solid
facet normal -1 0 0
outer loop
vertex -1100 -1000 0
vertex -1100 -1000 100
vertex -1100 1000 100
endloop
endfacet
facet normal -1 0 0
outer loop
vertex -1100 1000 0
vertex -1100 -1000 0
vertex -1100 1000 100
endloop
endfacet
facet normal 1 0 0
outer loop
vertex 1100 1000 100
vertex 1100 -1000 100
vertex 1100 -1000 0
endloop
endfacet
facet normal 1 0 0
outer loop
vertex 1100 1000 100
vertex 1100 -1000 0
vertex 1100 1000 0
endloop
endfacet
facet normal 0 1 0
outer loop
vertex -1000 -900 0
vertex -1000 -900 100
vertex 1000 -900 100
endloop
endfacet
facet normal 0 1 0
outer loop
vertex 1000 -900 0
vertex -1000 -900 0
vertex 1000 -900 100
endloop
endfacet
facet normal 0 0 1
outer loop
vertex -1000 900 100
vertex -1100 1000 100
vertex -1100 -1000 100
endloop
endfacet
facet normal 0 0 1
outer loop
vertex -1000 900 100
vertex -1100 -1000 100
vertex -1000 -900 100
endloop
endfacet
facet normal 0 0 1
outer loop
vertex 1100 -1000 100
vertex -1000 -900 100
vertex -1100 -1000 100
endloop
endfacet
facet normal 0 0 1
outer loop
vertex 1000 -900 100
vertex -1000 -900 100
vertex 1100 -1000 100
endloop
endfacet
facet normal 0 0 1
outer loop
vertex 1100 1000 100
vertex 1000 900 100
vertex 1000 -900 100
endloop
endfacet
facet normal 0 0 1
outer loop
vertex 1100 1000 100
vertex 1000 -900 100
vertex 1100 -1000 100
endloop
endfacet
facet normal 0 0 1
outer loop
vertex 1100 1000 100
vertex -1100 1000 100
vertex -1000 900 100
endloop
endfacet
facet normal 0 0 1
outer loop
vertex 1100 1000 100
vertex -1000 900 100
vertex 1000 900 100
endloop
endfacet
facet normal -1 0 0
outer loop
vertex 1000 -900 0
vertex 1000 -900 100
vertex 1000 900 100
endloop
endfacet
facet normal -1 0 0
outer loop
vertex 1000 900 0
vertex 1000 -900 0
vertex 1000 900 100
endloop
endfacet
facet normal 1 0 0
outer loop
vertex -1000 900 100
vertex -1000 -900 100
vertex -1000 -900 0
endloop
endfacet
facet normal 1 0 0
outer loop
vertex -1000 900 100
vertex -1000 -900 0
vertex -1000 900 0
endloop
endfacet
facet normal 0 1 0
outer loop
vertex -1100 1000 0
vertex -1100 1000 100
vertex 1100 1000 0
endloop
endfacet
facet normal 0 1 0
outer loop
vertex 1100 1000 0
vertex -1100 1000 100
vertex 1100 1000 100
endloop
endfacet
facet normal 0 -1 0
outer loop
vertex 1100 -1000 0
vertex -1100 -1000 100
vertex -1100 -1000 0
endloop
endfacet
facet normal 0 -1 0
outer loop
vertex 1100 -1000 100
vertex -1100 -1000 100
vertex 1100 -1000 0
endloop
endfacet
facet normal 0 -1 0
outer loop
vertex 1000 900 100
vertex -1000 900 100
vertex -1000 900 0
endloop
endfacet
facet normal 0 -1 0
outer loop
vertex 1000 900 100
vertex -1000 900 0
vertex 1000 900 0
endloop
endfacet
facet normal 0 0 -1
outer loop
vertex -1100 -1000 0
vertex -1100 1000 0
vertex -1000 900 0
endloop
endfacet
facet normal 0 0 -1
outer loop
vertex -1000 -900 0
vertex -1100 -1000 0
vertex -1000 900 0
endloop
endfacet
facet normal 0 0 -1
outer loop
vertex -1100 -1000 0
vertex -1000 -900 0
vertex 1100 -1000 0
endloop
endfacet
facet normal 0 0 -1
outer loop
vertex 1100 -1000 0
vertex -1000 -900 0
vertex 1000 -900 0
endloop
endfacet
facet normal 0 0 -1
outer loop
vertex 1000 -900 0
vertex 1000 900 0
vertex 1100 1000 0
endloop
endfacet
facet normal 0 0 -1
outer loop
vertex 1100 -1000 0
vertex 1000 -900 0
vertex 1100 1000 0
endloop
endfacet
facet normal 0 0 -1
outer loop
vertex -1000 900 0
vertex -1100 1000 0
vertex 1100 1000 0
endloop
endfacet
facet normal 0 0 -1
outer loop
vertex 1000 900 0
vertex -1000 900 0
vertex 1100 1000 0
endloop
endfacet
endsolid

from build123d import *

# Parameters (mm, degrees)
F0_W     = 2400
F0_H     = 2200
F1_DEPTH = 100
F2_W     = 2400
F2_H     = 2200
F2_W_2   = 2200
F2_H_2   = 2000
F3_DEPTH = 100.001
F2_W_3   = 2000
F2_H_3   = 1800
F4_DEPTH = 100.001


with BuildPart() as f1:
    # F0 (on Top) → F1 (new body)
    with BuildSketch(Plane.XY):
        Rectangle(F0_W, F0_H)
    extrude(amount=F1_DEPTH)

    # F2 (on face) → F3 (cut, through all)
    with BuildSketch(Plane.XY.offset(100)):
        Rectangle(F2_W, F2_H)
        Rectangle(F2_W_2, F2_H_2, mode=Mode.SUBTRACT)
    extrude(amount=-F3_DEPTH, mode=Mode.SUBTRACT)

    # F2 (on face) → F4 (cut, through all)
    with BuildSketch(Plane.XY.offset(100)):
        Rectangle(F2_W_3, F2_H_3)
    extrude(amount=-F4_DEPTH, mode=Mode.SUBTRACT)


solid = f1.part
